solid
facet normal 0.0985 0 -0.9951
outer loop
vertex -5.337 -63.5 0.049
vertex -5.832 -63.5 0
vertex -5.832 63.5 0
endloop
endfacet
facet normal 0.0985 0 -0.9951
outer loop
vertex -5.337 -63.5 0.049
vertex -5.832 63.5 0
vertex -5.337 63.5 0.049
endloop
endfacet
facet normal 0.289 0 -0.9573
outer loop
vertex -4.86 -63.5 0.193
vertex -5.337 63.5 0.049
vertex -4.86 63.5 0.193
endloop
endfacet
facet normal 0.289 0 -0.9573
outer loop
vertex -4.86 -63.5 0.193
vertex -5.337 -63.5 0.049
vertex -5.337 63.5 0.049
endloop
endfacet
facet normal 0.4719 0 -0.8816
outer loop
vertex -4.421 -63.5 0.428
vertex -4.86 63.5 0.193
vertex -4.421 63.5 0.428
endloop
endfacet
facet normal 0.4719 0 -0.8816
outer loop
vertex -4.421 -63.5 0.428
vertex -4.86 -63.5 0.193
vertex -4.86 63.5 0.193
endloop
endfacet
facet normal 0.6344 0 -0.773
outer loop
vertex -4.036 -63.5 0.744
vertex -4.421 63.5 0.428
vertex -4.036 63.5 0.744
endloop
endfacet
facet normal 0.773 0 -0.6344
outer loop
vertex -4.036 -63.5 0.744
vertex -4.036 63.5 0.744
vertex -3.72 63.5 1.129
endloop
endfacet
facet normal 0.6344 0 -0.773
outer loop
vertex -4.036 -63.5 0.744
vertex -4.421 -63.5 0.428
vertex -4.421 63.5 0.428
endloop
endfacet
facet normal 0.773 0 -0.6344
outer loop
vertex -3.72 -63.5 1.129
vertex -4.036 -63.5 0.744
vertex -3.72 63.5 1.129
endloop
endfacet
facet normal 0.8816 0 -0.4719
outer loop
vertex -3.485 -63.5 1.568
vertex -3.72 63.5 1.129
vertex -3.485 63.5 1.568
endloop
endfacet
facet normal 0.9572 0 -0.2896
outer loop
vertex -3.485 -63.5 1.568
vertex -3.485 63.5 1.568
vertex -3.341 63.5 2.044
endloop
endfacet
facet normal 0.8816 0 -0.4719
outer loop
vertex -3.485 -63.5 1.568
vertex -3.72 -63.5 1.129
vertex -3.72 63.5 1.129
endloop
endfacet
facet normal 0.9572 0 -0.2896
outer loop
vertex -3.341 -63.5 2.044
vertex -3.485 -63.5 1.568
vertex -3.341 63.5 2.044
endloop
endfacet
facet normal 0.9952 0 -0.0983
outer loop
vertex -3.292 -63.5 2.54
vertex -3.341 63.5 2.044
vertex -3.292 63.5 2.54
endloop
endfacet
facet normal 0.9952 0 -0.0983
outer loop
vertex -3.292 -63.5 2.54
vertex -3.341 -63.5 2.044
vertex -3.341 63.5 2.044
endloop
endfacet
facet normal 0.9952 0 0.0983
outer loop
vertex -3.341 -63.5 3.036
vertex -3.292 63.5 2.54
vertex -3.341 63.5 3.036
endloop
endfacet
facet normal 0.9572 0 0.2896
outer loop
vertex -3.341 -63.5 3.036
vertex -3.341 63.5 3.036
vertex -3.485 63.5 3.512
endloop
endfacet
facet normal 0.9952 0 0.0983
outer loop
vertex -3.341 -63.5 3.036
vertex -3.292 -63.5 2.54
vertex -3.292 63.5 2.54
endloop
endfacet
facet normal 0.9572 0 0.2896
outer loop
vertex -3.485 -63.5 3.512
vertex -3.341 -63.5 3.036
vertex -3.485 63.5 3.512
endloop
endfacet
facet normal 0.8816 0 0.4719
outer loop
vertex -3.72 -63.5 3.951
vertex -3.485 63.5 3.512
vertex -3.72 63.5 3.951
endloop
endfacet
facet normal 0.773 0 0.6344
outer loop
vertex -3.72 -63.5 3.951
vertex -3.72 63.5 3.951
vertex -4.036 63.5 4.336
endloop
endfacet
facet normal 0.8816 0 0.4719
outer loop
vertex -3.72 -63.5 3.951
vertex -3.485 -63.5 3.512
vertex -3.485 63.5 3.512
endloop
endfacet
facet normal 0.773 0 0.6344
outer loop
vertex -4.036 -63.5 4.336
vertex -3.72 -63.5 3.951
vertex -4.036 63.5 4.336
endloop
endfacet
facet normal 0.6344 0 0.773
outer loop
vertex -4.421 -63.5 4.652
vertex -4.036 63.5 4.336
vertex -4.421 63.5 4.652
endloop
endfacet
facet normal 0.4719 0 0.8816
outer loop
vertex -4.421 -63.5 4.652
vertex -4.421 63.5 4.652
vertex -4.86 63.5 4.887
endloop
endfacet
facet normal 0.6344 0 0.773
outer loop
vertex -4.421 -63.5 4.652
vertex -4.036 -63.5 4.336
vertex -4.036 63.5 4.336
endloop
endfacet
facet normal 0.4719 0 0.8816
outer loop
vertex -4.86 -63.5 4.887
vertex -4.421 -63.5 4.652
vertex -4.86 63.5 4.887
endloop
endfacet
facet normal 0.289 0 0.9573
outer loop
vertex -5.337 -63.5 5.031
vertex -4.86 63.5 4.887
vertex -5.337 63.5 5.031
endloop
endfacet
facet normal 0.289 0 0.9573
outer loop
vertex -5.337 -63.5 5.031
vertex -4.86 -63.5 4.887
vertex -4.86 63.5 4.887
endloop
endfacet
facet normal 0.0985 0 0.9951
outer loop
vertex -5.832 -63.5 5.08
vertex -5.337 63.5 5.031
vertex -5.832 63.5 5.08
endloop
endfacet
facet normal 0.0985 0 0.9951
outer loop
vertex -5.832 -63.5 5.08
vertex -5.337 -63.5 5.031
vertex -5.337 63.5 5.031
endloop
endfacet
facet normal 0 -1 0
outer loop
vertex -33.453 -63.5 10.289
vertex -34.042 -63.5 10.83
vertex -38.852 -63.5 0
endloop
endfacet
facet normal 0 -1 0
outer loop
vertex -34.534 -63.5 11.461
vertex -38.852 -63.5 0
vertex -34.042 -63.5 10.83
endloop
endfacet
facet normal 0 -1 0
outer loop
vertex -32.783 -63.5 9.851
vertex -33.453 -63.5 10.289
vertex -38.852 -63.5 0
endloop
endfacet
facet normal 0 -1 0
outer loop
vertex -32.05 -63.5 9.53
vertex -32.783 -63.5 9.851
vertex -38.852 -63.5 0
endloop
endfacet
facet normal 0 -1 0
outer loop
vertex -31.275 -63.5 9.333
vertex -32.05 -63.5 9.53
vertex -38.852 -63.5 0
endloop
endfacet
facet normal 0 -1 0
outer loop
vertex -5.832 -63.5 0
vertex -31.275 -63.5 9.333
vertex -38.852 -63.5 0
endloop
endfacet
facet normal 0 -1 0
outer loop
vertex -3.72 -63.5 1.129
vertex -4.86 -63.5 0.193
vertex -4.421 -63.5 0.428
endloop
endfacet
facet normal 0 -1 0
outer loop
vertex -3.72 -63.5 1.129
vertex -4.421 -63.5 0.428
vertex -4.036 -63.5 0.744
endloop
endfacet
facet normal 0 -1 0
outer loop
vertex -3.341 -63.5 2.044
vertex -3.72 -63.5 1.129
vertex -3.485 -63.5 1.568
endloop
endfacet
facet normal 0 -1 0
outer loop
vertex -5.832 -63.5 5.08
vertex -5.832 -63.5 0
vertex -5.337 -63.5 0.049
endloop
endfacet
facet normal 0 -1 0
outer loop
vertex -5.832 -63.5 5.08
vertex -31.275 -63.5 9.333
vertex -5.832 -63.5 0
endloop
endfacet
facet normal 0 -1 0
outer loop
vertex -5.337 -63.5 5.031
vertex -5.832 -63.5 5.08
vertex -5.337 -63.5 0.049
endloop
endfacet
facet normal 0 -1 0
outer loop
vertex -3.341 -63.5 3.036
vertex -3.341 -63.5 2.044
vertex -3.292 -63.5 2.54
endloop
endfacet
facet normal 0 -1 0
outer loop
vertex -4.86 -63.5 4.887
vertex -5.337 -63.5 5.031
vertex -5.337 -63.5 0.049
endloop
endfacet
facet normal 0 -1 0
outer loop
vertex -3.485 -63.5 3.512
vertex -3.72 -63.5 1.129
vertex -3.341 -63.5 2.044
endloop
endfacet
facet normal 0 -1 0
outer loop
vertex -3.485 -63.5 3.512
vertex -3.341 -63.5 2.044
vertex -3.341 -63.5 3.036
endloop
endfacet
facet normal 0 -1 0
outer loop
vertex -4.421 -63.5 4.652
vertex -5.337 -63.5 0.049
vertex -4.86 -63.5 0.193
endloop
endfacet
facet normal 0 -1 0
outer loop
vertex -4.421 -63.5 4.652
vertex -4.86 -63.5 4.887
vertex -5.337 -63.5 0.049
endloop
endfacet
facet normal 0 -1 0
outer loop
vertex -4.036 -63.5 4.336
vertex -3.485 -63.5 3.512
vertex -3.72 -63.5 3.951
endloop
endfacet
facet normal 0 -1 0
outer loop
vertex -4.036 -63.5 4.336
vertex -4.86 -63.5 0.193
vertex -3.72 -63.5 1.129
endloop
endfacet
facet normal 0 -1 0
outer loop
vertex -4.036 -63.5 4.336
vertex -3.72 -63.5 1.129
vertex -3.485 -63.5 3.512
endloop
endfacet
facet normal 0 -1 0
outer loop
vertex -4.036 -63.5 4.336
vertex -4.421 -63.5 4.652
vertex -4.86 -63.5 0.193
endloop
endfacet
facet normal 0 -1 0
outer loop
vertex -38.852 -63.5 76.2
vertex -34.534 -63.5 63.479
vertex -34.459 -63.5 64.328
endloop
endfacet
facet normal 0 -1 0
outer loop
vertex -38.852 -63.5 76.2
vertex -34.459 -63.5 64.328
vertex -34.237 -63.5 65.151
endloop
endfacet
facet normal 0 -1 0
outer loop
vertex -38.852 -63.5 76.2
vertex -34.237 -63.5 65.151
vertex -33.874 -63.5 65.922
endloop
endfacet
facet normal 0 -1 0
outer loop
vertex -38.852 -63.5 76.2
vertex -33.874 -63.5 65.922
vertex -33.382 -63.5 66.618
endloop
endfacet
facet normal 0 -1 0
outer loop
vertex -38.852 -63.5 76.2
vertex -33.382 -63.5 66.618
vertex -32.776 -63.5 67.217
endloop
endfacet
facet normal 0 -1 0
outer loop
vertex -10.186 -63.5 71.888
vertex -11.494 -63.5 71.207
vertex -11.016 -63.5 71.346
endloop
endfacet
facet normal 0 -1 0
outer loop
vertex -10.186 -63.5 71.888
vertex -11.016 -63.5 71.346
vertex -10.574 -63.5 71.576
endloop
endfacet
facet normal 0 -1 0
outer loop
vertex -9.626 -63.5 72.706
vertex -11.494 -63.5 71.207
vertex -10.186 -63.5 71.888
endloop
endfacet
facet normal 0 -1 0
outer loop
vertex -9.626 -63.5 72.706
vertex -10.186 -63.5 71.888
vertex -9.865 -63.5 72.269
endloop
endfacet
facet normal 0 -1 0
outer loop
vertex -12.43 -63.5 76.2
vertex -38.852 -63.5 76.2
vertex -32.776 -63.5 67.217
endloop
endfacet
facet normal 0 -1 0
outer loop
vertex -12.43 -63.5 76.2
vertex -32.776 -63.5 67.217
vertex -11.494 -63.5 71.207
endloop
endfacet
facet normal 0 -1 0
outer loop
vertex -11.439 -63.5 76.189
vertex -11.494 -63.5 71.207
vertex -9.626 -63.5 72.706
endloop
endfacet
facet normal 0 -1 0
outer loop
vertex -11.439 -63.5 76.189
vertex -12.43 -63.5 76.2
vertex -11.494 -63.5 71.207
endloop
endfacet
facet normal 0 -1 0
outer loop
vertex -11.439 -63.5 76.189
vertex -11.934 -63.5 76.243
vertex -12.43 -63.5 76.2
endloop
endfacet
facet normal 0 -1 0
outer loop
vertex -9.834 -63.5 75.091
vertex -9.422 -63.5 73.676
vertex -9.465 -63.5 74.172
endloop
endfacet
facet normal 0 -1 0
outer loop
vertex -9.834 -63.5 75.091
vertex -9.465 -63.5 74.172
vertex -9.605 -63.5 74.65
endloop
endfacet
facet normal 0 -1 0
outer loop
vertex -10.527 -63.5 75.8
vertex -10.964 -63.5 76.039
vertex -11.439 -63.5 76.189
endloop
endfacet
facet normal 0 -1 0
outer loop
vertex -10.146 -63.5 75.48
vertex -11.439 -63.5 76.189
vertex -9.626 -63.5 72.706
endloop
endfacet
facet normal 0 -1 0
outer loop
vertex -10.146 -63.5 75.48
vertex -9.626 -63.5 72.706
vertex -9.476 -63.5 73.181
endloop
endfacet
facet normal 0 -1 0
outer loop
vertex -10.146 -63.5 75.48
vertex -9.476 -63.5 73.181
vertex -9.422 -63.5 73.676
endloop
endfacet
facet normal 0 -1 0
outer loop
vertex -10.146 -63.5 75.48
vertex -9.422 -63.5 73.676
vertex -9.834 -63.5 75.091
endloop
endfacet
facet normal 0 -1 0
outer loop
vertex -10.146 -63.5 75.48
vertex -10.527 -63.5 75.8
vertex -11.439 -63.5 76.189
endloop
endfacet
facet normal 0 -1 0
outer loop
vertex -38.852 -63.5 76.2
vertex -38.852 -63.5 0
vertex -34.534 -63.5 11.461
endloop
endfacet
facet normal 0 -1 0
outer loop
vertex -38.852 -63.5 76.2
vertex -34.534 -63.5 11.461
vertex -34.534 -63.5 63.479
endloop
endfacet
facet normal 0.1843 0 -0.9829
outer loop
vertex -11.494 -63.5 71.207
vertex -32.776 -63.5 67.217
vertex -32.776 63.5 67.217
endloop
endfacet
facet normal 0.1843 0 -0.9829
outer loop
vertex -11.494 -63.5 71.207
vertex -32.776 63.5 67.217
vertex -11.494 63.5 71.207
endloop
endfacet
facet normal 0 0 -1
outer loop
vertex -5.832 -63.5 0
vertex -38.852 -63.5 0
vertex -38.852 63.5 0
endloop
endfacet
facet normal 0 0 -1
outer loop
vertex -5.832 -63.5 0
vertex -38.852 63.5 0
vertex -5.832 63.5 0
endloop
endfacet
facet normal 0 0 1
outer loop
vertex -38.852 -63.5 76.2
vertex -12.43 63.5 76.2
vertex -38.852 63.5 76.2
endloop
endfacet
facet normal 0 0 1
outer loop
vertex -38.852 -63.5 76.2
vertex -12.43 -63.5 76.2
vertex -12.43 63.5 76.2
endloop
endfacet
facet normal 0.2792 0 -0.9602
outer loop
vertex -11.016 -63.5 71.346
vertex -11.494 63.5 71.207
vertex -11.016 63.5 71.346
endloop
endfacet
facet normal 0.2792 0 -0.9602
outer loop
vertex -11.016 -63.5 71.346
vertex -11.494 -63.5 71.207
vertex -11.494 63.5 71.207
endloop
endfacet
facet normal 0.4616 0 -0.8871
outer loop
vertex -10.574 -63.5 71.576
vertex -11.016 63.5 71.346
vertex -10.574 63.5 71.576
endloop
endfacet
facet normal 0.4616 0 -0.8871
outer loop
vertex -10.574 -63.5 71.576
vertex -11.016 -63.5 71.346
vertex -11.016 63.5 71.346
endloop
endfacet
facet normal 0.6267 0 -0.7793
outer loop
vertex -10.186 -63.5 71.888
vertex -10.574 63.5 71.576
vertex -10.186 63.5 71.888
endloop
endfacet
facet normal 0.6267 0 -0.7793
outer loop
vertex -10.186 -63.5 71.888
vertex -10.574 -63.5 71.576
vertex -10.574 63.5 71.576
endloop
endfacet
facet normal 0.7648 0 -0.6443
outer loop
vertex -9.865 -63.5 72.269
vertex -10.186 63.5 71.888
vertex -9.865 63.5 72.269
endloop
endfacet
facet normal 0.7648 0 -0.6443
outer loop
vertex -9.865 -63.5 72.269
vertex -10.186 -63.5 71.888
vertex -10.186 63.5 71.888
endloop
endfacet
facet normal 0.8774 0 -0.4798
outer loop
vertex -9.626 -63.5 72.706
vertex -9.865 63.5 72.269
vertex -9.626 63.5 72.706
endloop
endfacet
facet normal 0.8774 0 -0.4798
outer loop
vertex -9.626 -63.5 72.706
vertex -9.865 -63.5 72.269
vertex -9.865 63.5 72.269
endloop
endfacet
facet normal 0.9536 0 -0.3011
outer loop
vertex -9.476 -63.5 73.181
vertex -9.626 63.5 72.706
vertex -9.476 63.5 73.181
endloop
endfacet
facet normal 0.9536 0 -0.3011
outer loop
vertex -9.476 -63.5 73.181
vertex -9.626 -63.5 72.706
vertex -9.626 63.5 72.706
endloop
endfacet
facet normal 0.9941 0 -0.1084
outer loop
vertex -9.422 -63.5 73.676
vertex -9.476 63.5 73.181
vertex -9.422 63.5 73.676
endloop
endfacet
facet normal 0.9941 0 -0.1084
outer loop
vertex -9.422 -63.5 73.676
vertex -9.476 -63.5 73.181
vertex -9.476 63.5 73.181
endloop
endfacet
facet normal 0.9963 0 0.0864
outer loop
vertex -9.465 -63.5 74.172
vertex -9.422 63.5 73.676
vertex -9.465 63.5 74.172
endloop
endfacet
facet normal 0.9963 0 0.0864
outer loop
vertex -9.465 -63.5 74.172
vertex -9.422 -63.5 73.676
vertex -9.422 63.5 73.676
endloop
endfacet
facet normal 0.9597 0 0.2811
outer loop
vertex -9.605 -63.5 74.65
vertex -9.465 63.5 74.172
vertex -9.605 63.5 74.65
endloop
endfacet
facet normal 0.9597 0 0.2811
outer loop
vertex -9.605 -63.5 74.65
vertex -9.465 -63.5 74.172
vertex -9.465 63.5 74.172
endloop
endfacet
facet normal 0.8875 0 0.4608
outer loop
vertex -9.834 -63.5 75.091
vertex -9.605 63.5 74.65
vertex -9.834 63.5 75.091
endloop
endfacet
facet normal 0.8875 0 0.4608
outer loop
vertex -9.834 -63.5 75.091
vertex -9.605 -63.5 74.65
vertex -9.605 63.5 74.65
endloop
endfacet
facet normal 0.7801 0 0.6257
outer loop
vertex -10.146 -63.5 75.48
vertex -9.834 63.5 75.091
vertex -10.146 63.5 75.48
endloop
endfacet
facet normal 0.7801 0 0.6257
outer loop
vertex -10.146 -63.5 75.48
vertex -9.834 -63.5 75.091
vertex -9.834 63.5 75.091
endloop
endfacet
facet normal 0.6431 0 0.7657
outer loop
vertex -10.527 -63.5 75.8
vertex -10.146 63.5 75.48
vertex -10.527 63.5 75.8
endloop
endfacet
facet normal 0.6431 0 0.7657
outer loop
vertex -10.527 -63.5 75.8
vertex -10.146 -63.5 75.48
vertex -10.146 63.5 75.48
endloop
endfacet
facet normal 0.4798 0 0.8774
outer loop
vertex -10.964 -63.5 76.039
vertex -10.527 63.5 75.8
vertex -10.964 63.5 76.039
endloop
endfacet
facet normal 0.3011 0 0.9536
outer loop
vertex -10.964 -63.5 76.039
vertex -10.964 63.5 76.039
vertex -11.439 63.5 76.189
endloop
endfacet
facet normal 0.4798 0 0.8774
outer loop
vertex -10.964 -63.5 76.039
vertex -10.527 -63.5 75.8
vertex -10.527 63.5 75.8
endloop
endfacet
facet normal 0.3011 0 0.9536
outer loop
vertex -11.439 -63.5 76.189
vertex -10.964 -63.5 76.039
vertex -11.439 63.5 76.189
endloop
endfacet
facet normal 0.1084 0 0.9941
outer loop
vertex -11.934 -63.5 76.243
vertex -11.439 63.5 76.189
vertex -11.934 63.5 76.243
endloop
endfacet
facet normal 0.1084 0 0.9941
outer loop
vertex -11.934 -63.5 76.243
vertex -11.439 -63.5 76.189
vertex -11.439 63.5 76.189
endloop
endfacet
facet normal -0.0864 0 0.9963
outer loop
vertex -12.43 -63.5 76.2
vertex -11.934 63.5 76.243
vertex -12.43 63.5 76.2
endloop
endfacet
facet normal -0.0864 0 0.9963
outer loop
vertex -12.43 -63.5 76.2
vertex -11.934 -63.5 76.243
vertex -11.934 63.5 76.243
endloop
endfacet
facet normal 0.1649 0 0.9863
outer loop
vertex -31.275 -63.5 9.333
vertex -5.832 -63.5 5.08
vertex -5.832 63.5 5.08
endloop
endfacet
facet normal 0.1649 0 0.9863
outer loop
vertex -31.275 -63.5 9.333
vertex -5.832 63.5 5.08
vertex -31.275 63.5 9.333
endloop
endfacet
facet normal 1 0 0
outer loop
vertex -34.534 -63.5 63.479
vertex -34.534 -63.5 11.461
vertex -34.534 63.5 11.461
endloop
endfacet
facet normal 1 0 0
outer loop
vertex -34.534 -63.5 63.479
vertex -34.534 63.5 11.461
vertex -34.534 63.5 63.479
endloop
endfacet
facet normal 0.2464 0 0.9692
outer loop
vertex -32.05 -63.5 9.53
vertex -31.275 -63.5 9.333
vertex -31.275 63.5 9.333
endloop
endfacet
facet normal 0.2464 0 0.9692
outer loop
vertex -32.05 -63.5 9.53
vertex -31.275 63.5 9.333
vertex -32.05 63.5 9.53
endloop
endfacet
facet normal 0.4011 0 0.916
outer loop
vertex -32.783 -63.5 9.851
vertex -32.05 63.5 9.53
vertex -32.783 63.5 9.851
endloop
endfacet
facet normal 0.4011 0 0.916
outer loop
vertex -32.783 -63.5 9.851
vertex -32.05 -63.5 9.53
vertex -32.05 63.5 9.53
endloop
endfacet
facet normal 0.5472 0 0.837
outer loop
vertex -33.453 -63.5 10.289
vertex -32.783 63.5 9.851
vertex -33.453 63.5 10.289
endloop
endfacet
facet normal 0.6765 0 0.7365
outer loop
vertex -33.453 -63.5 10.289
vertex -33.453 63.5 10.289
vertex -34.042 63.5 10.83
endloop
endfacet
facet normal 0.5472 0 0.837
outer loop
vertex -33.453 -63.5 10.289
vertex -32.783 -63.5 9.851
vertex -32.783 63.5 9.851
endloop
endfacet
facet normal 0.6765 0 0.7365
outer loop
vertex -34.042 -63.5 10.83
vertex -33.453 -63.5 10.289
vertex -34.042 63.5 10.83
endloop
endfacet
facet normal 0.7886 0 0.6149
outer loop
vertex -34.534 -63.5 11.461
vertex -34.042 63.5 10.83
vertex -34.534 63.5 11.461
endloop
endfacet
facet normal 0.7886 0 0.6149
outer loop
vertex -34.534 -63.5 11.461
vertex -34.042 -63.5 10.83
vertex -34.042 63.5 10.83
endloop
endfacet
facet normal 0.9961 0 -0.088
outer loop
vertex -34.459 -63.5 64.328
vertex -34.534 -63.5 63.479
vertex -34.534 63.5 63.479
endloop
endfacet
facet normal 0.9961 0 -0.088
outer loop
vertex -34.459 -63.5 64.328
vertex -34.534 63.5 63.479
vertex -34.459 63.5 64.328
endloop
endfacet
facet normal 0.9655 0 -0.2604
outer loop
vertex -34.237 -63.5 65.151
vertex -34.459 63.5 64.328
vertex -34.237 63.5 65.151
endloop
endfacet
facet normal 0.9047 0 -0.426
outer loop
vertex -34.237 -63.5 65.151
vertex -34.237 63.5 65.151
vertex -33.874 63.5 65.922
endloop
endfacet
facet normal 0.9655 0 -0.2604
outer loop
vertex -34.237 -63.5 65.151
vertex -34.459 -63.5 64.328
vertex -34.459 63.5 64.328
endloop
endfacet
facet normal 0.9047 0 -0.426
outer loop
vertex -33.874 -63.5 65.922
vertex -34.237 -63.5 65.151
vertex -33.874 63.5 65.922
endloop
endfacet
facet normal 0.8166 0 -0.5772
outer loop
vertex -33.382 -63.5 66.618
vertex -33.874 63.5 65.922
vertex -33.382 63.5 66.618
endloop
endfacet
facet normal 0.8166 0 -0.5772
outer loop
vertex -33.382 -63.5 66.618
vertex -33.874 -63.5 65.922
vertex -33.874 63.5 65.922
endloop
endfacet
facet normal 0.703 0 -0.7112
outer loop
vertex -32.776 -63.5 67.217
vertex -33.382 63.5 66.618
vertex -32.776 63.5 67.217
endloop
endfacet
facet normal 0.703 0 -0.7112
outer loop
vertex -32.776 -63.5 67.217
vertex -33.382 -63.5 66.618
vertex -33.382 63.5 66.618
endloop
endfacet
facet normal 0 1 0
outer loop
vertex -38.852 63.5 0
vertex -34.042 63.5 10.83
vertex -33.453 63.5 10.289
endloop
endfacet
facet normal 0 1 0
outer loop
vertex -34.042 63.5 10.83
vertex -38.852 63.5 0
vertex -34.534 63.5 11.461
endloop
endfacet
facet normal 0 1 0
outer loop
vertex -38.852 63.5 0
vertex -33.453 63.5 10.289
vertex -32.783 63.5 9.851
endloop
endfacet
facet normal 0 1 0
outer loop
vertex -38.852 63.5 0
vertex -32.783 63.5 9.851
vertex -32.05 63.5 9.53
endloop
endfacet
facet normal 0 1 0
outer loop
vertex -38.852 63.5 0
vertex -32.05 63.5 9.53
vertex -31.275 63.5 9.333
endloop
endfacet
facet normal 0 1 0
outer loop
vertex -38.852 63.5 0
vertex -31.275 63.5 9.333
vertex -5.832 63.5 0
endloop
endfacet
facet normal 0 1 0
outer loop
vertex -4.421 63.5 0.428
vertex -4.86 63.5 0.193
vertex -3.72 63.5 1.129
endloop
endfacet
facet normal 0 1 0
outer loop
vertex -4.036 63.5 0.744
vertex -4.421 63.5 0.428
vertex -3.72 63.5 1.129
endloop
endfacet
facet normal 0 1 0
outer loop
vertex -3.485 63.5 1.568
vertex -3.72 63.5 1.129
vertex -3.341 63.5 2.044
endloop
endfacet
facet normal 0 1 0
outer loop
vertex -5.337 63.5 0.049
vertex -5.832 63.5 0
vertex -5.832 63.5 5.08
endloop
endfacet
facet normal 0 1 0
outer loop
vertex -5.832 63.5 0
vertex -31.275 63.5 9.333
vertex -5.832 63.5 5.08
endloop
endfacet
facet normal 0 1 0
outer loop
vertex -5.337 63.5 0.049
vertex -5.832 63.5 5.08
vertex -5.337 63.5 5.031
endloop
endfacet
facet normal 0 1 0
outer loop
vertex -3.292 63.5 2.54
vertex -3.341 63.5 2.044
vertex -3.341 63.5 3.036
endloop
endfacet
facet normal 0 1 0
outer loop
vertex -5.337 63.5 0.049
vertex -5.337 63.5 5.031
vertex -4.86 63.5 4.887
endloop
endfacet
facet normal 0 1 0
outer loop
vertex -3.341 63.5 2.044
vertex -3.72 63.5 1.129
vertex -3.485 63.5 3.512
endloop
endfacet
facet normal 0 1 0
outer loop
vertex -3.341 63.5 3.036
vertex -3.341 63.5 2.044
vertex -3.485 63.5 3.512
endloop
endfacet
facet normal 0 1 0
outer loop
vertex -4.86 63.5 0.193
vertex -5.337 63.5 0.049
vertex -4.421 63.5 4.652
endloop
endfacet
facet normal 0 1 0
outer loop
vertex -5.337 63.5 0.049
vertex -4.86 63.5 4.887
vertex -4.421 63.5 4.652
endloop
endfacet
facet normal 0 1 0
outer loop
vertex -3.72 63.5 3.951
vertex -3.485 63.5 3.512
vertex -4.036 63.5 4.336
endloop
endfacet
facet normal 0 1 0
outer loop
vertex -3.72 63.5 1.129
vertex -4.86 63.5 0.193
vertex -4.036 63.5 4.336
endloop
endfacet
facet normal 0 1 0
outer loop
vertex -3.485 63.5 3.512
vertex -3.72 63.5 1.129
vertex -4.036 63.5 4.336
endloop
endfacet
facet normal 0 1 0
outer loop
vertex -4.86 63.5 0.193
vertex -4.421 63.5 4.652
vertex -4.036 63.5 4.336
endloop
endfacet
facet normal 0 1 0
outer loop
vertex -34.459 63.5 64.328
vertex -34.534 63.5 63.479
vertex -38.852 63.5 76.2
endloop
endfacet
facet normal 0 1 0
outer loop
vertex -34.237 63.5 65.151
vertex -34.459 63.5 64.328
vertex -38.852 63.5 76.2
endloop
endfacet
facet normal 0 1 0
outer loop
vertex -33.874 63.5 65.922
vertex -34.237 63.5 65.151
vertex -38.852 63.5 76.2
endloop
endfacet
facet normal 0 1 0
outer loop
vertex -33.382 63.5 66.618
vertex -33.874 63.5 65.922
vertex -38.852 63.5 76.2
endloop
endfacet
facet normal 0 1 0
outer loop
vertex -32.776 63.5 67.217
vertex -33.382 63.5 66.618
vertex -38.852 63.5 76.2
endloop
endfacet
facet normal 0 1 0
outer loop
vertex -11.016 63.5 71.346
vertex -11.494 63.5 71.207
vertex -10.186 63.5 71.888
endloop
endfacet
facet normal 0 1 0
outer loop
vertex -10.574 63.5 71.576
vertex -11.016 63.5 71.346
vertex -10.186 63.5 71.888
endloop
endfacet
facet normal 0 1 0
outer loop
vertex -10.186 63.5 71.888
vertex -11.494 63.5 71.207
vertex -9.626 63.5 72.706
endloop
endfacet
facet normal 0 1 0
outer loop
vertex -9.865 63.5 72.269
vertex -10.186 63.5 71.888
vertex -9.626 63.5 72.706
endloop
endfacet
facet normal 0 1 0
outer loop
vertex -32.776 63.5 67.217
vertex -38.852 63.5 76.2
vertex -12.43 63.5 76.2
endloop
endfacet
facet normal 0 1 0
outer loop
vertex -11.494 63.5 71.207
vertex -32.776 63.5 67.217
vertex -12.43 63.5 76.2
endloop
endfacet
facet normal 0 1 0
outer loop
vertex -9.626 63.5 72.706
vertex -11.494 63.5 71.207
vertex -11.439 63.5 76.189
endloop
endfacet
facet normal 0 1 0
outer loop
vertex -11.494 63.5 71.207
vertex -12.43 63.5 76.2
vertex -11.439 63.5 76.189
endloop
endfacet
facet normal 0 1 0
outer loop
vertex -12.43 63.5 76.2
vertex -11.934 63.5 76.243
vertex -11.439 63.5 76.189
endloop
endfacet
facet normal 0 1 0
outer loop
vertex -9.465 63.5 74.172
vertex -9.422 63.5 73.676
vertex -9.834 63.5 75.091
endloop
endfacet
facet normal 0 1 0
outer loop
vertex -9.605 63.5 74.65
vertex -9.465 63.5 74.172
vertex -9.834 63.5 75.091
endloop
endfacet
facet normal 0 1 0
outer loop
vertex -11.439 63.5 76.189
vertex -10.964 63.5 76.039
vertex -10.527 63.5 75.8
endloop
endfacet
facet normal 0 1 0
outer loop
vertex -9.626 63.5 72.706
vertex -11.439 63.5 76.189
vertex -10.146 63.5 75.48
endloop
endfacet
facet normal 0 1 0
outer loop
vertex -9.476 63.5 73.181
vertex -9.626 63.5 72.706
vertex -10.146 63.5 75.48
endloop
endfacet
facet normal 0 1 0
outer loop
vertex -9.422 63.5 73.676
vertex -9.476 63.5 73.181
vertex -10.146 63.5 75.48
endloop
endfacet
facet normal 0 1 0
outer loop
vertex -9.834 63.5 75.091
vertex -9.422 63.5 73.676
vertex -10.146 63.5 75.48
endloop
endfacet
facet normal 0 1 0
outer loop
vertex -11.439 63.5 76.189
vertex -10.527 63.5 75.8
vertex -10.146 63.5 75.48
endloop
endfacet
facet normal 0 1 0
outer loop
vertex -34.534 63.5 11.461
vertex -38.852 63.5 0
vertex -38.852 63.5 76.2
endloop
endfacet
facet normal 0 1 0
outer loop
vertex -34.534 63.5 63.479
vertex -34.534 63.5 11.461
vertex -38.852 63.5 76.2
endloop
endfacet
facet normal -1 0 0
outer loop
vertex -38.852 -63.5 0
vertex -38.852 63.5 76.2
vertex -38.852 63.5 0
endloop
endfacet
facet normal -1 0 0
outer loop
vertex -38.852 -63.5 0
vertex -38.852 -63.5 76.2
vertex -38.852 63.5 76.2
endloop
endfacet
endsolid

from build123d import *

# Parameters (mm, degrees)
F1_DEPTH = 63.5


with BuildPart() as f1:
    # F0 (on Front) → F1 (new body, symmetric)
    with BuildSketch(Plane.XZ):
        with BuildLine():
            Line((-38.852121, 76.2), (-38.852121, 0))
            Line((-38.852121, 0), (-5.832121, 0))
            ThreePointArc((-5.832121, 0), (-3.292121, 2.54), (-5.832121, 5.08))
            Line((-5.832121, 5.08), (-31.274684, 9.333155))
            ThreePointArc((-31.274684, 9.333155), (-33.127235, 10.056062), (-34.534121, 11.461485))
            Line((-34.534121, 11.461485), (-34.534121, 63.479383))
            ThreePointArc((-34.534121, 63.479383), (-34.072711, 65.544346), (-32.776249, 67.216516))
            Line((-32.776249, 67.216516), (-11.493637, 71.207009))
            ThreePointArc((-11.493637, 71.207009), (-9.465235, 74.171598), (-12.429824, 76.2))
            Line((-12.429824, 76.2), (-38.852121, 76.2))
        make_face()
    extrude(amount=F1_DEPTH, both=True)


solid = f1.part
